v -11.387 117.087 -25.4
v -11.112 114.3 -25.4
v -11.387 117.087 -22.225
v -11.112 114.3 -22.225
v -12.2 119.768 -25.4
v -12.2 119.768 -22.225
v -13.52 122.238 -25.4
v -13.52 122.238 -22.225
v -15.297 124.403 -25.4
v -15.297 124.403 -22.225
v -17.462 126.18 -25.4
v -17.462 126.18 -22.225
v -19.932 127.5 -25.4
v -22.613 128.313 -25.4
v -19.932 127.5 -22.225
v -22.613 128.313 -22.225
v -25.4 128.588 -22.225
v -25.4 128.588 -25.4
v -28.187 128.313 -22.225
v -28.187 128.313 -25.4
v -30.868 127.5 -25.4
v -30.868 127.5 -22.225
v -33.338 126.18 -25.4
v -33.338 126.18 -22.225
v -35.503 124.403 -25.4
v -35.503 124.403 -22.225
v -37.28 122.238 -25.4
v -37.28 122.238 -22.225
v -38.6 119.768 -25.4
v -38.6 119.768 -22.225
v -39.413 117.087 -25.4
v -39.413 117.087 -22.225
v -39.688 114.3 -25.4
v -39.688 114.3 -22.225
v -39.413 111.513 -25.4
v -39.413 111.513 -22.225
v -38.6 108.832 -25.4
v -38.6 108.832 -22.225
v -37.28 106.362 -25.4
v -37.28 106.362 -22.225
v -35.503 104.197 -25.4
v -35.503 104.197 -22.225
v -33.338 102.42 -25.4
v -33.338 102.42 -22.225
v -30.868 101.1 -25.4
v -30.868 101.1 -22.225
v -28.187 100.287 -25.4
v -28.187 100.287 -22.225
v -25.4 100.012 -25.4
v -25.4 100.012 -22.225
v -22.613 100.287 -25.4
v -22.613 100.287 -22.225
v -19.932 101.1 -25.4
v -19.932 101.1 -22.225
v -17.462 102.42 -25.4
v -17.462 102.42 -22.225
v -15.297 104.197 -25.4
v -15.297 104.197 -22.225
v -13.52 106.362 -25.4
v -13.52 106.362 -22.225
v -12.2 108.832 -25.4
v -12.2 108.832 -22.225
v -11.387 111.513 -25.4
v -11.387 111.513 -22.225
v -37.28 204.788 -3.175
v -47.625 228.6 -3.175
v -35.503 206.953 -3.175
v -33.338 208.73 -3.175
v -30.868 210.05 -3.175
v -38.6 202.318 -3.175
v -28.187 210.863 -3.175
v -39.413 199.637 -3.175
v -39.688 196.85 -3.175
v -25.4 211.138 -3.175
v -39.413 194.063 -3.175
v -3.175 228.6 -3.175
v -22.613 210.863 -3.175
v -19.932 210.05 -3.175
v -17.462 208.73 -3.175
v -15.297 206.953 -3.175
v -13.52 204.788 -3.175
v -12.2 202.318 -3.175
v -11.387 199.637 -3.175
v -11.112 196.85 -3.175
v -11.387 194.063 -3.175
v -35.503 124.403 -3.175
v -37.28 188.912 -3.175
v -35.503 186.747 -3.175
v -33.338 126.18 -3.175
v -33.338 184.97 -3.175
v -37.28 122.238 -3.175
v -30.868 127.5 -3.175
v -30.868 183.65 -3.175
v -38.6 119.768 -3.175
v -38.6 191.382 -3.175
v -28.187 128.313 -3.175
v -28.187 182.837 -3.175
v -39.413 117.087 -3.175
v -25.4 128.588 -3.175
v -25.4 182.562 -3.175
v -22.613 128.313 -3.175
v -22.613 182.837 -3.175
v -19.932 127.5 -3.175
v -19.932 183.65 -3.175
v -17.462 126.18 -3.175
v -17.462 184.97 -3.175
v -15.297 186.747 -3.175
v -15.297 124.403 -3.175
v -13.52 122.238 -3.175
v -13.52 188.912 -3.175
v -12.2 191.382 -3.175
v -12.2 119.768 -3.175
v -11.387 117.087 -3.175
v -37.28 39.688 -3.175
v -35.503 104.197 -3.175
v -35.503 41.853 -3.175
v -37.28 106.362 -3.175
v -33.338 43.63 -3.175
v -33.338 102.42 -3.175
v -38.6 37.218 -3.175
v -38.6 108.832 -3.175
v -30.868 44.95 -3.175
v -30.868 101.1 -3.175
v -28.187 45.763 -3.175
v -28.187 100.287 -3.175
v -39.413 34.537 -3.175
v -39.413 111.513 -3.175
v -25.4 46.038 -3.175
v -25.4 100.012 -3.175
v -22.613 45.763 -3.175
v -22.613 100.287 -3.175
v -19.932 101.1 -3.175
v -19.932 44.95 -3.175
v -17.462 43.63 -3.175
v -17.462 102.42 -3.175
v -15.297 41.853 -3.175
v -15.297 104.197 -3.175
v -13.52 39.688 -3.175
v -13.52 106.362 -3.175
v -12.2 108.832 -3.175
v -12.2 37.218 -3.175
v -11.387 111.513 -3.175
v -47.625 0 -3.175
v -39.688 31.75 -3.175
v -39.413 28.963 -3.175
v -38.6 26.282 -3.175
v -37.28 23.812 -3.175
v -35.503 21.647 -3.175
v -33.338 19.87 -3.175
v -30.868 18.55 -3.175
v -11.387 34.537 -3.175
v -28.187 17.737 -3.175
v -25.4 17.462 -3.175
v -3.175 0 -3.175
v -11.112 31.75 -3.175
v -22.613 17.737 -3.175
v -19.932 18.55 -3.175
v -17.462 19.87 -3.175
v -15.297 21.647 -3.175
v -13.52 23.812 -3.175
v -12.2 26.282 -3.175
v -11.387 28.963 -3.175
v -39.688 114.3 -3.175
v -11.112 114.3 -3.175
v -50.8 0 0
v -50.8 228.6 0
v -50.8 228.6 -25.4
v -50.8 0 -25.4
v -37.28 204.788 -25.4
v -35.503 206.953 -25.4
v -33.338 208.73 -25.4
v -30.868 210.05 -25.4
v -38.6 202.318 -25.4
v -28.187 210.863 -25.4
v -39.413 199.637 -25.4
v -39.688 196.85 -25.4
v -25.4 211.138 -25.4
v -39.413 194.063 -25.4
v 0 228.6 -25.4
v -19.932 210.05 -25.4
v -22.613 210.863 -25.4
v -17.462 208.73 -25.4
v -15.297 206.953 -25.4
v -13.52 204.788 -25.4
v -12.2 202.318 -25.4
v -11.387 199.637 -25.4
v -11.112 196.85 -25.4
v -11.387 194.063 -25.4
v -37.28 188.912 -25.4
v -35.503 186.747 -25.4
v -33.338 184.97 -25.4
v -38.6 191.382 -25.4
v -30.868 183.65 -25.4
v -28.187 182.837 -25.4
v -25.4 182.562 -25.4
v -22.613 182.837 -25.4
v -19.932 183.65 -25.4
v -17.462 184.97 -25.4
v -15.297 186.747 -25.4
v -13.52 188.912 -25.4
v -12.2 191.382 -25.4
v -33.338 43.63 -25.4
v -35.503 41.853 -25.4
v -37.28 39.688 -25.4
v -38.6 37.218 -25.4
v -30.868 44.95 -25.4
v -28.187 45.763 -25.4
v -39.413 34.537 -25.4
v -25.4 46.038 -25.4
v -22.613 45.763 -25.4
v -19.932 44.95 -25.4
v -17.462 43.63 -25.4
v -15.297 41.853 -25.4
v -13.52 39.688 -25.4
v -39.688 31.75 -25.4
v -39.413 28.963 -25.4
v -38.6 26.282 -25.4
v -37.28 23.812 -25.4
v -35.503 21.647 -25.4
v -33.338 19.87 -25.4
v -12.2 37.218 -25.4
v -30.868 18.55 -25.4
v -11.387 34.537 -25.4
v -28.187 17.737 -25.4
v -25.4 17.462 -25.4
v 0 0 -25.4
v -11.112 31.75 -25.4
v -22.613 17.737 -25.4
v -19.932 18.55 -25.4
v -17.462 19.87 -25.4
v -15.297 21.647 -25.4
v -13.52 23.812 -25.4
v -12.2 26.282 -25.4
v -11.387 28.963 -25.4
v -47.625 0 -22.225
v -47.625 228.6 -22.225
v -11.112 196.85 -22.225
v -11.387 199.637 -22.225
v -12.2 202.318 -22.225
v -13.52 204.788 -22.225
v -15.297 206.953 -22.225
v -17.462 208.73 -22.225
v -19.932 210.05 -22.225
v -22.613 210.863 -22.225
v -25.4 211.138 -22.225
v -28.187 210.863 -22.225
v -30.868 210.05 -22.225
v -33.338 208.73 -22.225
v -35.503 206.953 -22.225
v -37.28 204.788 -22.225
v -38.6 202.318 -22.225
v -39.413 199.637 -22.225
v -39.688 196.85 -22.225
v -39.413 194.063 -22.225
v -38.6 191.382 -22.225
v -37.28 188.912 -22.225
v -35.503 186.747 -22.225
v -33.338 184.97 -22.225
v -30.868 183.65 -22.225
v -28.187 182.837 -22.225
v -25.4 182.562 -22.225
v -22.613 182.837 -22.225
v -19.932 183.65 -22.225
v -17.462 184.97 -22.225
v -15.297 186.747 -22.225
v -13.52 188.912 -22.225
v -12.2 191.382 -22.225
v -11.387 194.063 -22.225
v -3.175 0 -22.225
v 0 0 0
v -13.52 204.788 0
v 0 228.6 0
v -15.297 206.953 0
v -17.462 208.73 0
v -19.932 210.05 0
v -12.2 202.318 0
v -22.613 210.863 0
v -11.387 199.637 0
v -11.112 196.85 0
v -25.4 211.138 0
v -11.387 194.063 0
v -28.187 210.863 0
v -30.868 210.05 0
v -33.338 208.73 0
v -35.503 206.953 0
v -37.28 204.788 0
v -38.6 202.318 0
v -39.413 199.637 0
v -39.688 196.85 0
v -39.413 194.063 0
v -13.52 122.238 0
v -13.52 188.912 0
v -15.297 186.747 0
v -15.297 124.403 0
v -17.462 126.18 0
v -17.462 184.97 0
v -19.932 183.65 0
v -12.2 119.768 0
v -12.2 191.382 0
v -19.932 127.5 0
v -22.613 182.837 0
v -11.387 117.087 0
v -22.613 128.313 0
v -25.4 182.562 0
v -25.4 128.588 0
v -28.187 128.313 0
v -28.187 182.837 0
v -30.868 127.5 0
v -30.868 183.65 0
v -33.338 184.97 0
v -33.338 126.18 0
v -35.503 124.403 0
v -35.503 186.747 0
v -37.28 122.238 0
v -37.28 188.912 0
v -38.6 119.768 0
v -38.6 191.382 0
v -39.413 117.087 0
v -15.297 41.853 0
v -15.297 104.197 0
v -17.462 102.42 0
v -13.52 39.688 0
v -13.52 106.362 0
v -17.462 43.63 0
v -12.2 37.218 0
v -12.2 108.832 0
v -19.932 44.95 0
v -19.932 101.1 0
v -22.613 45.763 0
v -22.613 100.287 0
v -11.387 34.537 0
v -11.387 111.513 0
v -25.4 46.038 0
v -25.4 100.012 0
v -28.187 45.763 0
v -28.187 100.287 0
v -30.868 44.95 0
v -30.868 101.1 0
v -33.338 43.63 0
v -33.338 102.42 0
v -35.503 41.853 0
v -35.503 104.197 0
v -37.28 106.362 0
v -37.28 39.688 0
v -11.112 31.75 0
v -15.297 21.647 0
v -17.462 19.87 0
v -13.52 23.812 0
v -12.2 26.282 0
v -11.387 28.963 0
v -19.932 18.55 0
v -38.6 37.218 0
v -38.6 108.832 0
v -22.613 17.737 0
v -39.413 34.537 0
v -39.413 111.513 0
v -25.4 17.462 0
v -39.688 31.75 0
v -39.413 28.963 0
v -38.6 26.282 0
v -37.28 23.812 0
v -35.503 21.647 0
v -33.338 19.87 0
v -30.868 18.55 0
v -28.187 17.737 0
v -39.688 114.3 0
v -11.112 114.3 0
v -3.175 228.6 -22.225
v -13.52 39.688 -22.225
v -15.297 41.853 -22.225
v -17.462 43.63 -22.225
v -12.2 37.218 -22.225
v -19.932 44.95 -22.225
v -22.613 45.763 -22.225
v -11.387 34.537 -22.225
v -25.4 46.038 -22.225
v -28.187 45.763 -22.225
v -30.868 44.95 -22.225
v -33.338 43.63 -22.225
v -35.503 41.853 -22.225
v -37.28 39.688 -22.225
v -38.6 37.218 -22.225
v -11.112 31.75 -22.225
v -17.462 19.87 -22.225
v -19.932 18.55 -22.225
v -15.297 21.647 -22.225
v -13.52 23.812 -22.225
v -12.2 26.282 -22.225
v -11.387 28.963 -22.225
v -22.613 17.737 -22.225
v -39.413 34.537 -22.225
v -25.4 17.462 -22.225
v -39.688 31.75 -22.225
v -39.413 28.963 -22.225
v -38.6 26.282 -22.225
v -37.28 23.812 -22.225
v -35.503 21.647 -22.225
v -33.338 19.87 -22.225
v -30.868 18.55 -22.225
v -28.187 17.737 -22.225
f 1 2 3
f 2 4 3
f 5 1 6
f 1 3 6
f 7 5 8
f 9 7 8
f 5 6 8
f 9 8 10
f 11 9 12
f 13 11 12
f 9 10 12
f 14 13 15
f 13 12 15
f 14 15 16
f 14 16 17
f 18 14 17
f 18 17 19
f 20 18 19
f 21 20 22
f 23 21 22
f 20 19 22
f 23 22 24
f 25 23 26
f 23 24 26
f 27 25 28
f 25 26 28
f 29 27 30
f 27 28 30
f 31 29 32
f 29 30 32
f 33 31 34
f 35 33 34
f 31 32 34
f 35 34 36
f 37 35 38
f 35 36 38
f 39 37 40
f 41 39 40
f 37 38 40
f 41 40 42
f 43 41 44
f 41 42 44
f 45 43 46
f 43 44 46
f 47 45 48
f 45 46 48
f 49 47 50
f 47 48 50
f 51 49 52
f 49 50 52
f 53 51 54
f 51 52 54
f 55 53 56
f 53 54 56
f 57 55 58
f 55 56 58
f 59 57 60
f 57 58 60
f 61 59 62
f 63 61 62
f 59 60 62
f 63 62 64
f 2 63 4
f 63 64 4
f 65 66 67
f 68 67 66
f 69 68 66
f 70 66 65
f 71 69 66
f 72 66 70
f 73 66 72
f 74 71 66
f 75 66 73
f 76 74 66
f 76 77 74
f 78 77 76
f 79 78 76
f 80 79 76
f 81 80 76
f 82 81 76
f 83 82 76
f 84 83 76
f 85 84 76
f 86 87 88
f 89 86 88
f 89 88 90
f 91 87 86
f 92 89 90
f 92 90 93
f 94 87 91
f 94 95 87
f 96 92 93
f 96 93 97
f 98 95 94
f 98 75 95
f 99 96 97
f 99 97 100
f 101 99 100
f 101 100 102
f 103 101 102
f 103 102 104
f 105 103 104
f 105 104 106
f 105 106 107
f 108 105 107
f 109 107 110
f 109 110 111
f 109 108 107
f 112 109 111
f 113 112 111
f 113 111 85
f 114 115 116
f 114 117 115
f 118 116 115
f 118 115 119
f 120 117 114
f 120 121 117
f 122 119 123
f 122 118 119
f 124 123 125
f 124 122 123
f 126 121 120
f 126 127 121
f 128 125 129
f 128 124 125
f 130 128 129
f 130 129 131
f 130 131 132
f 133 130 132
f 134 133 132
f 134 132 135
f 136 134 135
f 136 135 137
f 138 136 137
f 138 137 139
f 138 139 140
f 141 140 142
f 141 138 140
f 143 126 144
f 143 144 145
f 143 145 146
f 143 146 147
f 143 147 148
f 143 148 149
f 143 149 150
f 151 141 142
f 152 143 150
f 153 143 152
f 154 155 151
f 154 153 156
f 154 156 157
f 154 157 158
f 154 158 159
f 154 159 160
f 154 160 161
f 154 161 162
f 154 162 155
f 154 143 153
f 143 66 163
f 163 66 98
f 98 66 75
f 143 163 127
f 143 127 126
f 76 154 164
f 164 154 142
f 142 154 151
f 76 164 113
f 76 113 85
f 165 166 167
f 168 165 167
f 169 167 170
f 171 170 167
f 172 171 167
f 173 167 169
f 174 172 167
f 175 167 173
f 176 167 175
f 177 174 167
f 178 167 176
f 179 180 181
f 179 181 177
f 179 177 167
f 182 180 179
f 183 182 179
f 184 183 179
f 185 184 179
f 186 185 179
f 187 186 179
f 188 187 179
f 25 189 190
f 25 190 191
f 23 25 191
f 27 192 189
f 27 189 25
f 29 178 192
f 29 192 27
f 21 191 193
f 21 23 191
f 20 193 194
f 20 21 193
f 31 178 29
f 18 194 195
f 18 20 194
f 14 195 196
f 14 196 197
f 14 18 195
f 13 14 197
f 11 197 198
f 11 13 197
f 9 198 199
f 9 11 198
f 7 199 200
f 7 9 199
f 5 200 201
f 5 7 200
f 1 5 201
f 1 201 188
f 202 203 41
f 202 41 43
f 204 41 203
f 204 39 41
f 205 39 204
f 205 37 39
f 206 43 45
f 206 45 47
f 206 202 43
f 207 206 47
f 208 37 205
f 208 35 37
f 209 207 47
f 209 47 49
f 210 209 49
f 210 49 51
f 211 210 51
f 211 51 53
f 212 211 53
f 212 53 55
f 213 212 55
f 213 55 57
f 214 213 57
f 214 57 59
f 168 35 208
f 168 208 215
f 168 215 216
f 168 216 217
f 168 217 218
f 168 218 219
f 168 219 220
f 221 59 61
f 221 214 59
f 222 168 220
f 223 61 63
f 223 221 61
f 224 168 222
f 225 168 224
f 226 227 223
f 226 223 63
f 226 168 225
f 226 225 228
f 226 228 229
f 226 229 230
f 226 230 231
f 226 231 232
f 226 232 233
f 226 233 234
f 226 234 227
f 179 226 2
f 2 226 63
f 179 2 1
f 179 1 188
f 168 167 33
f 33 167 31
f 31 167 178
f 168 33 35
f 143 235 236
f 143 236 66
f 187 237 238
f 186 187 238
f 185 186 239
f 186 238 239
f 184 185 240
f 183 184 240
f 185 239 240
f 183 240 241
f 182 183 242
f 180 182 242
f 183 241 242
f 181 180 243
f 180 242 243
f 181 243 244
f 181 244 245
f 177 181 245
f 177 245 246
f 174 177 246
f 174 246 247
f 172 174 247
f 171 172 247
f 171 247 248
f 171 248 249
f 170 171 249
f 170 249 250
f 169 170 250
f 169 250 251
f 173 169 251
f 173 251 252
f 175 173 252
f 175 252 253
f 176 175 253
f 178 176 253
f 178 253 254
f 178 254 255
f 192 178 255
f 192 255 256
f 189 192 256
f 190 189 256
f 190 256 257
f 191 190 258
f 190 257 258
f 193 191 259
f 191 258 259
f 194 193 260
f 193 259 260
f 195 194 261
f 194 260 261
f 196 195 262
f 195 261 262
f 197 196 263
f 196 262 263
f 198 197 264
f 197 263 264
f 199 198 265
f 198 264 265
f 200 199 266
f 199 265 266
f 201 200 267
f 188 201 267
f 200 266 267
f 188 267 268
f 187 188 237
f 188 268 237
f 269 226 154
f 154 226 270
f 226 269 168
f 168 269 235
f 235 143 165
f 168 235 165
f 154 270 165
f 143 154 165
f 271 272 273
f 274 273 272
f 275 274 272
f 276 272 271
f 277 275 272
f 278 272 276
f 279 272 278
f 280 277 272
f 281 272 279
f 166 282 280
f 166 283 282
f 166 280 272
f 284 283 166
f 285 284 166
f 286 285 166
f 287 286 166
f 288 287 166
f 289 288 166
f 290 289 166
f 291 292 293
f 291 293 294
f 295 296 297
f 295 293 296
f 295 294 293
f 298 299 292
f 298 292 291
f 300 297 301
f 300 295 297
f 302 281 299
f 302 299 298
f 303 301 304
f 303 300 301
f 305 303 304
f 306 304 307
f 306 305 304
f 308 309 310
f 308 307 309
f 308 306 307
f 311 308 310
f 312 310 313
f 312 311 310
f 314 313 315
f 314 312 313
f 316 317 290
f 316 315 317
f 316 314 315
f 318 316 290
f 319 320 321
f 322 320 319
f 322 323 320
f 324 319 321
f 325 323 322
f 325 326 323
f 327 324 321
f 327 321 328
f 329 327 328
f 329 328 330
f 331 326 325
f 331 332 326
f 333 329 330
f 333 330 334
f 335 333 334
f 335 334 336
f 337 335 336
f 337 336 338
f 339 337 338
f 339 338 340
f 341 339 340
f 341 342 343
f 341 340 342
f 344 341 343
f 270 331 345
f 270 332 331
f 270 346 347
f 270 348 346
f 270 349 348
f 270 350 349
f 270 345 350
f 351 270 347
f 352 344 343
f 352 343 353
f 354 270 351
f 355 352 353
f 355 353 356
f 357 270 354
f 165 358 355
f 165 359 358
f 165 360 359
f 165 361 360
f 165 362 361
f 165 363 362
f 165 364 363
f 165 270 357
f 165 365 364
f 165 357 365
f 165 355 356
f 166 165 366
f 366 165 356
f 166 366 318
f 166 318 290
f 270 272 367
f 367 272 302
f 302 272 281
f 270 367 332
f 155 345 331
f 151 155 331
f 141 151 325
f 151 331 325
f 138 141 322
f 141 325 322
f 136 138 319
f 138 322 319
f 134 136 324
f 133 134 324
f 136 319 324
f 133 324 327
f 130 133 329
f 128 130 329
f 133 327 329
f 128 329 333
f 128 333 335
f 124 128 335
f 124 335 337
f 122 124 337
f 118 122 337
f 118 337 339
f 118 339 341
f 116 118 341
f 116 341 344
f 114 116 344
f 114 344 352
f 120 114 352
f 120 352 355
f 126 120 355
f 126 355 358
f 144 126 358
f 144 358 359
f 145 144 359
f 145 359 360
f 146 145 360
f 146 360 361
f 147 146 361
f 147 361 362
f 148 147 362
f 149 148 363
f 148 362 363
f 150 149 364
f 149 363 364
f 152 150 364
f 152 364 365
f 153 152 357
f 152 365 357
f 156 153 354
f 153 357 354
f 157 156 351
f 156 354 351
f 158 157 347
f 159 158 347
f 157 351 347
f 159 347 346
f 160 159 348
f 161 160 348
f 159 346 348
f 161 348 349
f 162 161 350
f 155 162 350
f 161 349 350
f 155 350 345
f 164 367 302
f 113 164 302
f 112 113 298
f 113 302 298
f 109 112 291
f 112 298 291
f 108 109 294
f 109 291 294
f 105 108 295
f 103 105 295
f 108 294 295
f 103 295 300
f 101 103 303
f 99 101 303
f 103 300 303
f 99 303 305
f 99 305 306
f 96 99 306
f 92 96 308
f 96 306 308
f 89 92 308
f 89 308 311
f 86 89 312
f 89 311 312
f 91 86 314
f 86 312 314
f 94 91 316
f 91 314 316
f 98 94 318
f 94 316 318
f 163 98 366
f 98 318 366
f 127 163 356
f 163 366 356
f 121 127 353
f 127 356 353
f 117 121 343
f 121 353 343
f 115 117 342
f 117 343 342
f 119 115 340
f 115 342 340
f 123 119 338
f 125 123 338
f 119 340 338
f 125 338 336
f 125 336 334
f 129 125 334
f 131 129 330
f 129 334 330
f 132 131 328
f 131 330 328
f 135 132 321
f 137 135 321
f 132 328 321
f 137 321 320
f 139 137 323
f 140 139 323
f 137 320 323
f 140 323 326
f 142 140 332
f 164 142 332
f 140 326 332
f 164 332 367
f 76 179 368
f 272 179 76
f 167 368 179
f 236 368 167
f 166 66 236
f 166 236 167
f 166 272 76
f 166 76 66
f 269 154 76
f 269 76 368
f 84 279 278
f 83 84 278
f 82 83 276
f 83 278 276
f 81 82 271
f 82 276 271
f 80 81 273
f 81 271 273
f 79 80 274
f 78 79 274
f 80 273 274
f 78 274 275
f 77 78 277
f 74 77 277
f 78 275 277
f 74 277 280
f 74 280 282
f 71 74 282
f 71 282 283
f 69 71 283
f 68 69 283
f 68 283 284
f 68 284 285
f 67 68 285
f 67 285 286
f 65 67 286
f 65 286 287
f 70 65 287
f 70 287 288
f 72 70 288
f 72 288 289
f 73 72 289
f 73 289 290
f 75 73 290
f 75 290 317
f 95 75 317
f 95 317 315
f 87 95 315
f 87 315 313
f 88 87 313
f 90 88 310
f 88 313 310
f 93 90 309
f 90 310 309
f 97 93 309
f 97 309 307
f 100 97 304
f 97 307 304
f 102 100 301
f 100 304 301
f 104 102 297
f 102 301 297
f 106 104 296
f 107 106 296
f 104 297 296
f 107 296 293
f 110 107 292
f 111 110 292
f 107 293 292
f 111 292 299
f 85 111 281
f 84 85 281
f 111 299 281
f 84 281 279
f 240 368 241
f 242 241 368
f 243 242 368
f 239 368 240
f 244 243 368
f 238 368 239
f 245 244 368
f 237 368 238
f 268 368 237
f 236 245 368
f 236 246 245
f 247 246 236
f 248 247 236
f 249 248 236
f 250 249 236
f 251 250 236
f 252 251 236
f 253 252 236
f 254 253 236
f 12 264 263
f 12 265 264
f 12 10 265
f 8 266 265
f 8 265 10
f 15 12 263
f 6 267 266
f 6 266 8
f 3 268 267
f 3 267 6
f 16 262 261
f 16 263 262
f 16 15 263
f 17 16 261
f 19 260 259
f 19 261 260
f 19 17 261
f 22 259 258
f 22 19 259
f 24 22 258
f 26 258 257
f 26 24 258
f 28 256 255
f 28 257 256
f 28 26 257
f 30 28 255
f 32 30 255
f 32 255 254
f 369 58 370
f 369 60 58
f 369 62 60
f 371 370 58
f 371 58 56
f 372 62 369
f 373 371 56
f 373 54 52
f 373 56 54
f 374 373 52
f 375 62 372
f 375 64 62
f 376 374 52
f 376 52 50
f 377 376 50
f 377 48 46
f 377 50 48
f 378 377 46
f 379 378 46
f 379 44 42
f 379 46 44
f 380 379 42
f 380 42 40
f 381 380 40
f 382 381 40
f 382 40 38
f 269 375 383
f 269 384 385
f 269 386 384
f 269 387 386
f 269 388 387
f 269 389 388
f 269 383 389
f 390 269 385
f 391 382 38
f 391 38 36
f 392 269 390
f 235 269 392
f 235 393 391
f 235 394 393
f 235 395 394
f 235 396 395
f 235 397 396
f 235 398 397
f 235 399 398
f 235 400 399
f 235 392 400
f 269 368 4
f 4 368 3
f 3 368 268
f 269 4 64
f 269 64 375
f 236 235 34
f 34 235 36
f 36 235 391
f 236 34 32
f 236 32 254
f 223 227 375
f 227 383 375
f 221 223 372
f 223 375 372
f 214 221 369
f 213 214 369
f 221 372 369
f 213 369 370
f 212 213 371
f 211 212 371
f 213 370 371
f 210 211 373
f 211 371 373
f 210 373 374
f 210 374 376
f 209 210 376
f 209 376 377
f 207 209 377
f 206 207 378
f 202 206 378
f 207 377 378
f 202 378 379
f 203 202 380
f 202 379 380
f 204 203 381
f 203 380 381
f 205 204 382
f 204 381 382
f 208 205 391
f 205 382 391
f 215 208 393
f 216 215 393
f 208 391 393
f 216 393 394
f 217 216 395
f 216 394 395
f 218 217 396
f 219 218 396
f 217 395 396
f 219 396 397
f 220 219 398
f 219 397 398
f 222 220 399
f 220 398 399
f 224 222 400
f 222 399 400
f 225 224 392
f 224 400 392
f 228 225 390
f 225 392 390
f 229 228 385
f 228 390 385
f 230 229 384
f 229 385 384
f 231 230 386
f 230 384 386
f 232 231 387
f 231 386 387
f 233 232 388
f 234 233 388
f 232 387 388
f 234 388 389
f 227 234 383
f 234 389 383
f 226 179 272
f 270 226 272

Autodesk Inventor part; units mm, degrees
ref_plane "YZ Plane" through (0, 0, 0) normal (1, 0, 0) x (0, 1, 0)
ref_plane "XZ Plane" through (0, 0, 0) normal (0, 1, 0) x (-1, 0, 0)
ref_plane "XY Plane" through (0, 0, 0) normal (0, 0, 1) x (1, 0, 0)
sketch "Sketch2" plane through (0, 0, 0) normal (0, 1, 0) x (-1, 0, 0)
  line L0 (0, 0) -> (50.8, 0)
  line L1 (50.8, 0) -> (50.8, -25.4)
  line L2 (50.8, -25.4) -> (0, -25.4)
  line L3 (0, -25.4) -> (0, 0)
  line L4 (47.625, -22.225) -> (47.625, -3.175)
  line L5 (47.625, -3.175) -> (3.175, -3.175)
  line L6 (3.175, -3.175) -> (3.175, -22.225)
  line L7 (3.175, -22.225) -> (47.625, -22.225)
  dimension "d4" = 50.8
  dimension "d5" = 25.4
  dimension "d6" = 3.175
extrude "Extrusion2" add sketch "Sketch2" along normal blind 228.6
sketch "Sketch3" plane through (-50.8, 0, 0) normal (0, 0, 1) x (1, 0, 0)
  circle A0 centre (25.4, 31.75) radius 14.2875
  line L0 (50.8, 0) -> (0, 0) projected
  line L1 (0, 0) -> (0, 228.6) projected
  circle A1 centre (25.4, 196.85) radius 14.2875
  line L2 (0, 228.6) -> (50.8, 228.6) projected
  circle A2 centre (25.4, 114.3) radius 14.2875
  dimension "d9" = 31.75
  dimension "d10" = 25.4
  dimension "d11" = 25.4
  dimension "d12" = 31.75
  dimension "d13" = 114.3
  dimension "d14" = 25.4
  dimension "d15" = 28.575
  dimension "d16" = 28.575
  dimension "d17" = 28.575
extrude "Extrusion3" cut sketch "Sketch3" against normal blind 50.8
properties part number "AluminumBar-1111-2020"
